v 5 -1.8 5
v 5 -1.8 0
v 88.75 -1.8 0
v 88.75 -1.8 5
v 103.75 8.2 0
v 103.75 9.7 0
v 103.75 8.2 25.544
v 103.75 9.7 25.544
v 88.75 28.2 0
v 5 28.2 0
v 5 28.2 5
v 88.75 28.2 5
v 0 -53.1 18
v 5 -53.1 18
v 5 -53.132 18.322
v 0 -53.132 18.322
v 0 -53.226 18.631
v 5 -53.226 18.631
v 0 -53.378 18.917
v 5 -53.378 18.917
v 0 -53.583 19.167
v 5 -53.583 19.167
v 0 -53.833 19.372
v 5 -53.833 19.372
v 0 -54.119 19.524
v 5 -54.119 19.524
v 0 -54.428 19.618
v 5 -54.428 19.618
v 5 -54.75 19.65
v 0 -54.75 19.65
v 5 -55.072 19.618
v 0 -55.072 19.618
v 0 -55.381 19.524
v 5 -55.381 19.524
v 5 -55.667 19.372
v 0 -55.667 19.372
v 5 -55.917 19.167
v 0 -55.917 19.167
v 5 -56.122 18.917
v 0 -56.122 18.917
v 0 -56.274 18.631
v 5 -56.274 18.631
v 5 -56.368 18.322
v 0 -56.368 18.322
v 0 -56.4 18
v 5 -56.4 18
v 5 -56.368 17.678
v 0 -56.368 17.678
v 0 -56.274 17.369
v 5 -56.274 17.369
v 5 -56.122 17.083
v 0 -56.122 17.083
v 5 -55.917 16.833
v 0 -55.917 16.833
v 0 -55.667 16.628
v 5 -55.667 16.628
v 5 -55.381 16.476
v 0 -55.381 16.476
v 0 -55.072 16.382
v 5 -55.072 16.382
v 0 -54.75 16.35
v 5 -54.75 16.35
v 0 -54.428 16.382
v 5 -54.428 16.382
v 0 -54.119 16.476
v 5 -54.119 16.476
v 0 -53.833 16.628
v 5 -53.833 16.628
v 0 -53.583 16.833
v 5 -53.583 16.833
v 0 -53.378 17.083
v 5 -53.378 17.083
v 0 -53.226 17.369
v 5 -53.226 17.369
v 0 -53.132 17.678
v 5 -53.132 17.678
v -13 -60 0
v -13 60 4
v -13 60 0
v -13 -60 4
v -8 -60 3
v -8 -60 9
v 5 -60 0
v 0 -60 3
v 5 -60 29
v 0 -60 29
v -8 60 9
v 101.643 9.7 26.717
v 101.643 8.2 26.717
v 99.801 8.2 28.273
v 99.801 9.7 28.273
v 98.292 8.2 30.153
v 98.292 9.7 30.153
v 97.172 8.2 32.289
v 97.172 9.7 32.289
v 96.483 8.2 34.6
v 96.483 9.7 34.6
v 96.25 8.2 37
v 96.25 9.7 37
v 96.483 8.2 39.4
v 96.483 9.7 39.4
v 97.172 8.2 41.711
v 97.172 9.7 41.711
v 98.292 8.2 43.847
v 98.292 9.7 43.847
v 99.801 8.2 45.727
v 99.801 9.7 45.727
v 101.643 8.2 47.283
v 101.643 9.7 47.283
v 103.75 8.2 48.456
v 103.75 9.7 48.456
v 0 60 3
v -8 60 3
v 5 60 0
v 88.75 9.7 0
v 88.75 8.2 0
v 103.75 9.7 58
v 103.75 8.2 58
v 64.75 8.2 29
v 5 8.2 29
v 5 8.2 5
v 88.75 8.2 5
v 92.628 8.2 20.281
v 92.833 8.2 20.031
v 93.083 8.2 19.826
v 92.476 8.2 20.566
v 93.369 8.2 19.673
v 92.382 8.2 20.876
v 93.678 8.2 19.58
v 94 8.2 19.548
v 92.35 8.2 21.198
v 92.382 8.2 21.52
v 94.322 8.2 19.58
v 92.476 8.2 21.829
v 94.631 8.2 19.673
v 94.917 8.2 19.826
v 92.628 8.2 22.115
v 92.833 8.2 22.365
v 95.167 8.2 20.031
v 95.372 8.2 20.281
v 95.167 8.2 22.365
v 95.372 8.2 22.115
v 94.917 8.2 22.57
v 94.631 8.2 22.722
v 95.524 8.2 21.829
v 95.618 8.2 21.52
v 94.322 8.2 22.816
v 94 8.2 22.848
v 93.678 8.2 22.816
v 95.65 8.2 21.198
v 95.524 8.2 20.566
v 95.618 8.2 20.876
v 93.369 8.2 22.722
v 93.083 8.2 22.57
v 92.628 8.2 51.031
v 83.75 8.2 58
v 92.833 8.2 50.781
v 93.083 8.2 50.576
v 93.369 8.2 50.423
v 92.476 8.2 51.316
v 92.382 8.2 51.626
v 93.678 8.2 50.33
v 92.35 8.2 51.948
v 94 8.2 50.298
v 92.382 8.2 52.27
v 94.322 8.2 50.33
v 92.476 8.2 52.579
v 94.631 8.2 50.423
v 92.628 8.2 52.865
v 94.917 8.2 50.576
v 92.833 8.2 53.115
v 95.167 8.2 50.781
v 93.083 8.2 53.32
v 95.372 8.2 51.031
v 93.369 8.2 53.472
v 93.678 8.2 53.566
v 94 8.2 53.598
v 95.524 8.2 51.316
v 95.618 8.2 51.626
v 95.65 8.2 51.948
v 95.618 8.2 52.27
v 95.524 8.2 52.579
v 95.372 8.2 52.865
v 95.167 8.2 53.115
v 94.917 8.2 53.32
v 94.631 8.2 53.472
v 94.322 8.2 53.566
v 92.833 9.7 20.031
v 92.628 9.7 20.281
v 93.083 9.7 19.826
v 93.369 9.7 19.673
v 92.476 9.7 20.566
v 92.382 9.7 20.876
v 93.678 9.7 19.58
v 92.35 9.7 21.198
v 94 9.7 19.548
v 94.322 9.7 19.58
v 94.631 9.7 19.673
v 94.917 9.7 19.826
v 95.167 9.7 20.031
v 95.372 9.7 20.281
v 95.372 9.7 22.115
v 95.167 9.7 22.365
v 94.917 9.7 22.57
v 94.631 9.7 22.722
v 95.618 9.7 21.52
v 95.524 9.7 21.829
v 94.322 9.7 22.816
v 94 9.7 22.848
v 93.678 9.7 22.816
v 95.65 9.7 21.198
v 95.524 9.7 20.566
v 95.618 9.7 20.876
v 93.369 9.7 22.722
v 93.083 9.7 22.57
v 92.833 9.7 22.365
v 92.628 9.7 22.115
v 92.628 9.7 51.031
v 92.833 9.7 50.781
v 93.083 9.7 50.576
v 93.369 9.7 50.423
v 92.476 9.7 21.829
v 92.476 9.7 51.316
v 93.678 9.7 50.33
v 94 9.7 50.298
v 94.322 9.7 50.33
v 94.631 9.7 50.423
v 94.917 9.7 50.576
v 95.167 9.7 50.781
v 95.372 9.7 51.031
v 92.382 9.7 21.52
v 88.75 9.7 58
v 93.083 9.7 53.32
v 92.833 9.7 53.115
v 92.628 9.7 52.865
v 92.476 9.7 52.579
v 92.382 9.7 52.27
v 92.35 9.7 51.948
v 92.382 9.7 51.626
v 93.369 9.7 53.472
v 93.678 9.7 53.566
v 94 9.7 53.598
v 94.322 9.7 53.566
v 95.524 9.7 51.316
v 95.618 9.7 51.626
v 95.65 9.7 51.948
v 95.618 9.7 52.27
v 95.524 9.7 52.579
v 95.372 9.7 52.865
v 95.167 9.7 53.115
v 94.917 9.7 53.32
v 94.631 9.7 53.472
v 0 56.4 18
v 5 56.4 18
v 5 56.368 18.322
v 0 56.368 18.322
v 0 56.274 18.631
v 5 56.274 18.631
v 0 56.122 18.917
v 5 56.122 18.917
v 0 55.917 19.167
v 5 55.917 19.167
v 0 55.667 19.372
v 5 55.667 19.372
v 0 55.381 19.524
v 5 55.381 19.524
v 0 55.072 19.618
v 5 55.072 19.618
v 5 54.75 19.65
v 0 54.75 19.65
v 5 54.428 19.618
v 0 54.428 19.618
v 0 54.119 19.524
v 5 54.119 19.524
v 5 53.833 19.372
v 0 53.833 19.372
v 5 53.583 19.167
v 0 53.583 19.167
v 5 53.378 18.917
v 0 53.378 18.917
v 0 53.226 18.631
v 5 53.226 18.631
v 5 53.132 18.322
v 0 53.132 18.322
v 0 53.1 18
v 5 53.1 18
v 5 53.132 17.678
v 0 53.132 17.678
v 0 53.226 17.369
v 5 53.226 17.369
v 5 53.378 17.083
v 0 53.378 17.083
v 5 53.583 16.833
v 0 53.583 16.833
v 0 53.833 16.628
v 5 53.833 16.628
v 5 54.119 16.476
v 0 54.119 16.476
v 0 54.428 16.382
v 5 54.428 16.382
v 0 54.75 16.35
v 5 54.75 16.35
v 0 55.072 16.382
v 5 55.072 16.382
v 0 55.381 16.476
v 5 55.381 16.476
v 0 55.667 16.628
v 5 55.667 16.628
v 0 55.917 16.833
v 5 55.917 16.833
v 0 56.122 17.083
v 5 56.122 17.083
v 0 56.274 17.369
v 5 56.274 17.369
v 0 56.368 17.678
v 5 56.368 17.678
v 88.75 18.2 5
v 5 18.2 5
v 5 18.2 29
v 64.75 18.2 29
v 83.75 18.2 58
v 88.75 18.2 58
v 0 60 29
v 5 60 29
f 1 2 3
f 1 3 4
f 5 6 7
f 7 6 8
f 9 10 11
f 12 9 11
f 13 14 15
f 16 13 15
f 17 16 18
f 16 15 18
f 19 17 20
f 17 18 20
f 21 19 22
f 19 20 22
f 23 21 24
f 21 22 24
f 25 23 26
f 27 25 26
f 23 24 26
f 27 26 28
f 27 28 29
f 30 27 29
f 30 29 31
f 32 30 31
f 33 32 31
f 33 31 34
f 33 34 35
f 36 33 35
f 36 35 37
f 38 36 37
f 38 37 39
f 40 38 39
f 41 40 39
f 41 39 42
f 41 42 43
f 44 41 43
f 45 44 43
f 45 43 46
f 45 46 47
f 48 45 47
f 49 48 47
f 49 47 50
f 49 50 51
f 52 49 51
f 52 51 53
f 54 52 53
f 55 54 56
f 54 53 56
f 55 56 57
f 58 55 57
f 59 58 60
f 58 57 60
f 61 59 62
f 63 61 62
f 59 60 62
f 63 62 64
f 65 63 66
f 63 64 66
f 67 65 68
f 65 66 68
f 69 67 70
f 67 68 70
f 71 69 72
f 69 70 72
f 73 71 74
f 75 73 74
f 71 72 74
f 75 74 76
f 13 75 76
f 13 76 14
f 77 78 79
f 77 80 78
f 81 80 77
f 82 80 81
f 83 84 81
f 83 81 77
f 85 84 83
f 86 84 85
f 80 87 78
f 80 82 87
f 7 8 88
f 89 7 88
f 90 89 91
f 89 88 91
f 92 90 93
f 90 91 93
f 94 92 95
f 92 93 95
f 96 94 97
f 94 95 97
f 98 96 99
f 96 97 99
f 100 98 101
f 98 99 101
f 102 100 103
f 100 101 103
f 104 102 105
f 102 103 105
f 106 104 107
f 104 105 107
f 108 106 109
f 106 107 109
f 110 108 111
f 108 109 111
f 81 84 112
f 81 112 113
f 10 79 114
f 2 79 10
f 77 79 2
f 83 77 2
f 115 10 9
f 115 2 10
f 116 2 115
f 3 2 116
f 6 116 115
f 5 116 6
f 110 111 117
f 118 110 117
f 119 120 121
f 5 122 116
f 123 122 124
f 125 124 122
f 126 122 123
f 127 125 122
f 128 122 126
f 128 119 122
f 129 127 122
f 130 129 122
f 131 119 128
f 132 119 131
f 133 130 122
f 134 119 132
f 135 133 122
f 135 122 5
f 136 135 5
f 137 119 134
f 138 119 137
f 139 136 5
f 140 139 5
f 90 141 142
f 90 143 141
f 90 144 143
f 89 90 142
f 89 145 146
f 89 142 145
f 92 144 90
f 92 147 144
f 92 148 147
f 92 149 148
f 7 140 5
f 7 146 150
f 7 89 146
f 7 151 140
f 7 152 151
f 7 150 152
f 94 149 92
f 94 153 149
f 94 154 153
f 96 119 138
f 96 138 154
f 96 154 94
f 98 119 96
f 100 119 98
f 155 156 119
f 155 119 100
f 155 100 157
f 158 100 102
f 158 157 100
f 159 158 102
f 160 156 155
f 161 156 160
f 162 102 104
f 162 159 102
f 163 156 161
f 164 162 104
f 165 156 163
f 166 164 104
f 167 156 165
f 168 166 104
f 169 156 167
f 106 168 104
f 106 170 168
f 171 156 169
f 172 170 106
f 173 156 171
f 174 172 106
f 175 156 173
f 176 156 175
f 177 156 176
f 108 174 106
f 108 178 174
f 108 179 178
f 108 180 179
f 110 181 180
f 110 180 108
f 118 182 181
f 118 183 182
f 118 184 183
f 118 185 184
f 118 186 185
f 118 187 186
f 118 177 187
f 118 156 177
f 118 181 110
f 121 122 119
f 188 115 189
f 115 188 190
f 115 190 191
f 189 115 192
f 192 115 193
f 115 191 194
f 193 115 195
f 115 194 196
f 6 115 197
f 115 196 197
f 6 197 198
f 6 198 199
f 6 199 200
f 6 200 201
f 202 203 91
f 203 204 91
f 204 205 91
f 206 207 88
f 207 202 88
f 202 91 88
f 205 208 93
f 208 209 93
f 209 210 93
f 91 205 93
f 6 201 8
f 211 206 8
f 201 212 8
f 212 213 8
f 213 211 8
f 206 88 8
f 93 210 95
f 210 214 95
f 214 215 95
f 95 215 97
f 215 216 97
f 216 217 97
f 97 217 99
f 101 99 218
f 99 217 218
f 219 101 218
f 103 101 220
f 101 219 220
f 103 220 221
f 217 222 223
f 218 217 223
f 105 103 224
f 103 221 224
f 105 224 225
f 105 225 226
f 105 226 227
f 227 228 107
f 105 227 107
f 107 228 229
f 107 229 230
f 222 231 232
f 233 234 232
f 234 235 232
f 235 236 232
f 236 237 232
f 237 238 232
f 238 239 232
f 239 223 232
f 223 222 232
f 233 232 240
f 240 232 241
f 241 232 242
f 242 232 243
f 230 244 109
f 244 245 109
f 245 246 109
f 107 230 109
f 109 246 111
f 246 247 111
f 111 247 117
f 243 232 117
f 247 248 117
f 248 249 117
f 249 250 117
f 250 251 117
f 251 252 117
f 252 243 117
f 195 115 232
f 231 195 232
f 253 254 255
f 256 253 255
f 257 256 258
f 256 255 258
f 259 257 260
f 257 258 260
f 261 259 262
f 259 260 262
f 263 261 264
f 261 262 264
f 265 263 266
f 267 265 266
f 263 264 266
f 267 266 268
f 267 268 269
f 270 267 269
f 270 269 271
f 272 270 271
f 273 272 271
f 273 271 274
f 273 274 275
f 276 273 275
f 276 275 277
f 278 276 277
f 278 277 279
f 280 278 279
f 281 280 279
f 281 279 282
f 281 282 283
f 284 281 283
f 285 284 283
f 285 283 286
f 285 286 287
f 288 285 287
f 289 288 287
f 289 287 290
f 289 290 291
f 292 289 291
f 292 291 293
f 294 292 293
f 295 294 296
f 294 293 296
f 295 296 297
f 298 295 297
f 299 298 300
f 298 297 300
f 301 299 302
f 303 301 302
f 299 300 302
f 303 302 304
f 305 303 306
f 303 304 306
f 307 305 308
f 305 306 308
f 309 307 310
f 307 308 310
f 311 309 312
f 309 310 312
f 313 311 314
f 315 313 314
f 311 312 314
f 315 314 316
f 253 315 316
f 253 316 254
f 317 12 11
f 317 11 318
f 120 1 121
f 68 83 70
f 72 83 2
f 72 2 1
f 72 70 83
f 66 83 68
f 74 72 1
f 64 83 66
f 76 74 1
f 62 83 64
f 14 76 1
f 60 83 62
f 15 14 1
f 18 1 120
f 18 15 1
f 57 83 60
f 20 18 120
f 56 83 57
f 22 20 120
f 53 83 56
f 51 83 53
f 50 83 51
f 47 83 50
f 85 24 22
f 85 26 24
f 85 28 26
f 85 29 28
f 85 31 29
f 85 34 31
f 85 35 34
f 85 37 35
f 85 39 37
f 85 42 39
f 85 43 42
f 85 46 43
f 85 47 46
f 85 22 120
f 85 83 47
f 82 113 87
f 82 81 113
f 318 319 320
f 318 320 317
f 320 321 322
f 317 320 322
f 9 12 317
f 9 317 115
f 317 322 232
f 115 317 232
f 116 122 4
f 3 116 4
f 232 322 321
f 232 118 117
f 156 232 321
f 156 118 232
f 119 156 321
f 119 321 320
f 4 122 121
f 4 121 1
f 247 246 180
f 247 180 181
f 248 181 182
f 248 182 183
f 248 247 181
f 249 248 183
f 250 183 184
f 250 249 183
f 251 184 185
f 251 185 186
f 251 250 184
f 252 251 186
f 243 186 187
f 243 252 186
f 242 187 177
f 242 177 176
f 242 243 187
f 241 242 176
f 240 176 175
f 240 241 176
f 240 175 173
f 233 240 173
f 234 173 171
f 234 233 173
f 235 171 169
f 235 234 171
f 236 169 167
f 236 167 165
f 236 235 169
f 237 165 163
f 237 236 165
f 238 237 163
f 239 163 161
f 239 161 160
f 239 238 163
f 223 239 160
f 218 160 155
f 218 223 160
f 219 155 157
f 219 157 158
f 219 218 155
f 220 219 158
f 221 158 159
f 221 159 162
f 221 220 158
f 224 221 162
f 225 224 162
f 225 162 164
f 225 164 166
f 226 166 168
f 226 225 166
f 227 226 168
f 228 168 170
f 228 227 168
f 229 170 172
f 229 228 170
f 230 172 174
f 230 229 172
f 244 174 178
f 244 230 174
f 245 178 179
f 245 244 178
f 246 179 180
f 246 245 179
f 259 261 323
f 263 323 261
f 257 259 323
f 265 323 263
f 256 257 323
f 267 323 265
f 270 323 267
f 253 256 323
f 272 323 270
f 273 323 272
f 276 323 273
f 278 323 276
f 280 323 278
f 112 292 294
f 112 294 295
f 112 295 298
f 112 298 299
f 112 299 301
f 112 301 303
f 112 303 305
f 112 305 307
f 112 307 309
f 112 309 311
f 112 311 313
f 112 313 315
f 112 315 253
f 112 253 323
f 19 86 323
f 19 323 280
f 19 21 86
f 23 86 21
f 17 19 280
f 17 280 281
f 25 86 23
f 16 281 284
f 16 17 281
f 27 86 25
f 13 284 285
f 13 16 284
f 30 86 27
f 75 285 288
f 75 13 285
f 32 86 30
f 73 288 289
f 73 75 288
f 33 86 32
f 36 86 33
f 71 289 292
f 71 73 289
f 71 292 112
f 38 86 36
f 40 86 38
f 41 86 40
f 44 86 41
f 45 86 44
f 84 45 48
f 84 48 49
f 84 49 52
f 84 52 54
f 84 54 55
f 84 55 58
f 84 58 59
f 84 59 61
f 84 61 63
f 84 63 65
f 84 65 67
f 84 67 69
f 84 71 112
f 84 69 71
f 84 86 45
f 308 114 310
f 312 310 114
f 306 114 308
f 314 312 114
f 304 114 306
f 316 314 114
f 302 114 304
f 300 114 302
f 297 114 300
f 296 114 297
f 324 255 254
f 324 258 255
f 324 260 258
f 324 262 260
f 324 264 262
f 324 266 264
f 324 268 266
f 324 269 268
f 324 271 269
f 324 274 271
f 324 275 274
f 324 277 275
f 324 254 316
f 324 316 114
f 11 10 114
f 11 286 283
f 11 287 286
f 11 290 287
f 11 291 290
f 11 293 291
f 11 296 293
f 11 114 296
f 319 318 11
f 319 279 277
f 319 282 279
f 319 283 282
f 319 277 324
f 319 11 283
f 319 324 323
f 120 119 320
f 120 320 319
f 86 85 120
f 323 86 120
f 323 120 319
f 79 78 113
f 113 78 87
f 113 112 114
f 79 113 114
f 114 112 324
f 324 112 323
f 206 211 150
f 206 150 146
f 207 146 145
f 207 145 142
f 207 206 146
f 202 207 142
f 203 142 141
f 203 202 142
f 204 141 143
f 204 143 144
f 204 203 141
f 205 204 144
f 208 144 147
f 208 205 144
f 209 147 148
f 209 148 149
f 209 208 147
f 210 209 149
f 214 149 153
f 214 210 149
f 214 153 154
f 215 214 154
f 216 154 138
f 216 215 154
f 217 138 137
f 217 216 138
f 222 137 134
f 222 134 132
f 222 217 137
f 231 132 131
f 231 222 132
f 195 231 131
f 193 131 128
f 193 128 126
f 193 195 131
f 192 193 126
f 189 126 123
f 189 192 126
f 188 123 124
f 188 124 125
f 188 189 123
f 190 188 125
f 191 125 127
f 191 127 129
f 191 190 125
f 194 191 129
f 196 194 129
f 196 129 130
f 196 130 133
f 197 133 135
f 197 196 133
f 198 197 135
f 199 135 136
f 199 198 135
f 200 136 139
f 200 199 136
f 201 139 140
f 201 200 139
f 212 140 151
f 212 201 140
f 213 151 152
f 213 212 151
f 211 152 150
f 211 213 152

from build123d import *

# Parameters (mm, degrees)
F1_R          = 1.65
F2_DEPTH      = 1.5
F3_DEPTH      = 1.5
F3_DEPTH_BACK = 8.5
F4_W          = 10
F4_H          = 5
F5_DEPTH      = 88.75
F7_DEPTH      = 60
F9_D          = 3.3


with BuildPart() as f2:
    # F1 (on offset) → F2 (new body)
    with BuildSketch(Plane.XZ.offset(-9.7)):
        with BuildLine():
            Line((88.75, 58), (88.75, 0))
            Line((88.75, 0), (103.75, 0))
            Line((103.75, 0), (103.75, 25.543561))
            ThreePointArc((103.75, 25.543561), (96.25, 37), (103.75, 48.456439))
            Line((103.75, 48.456439), (103.75, 58))
            Line((103.75, 58), (88.75, 58))
        make_face()
        with Locations((94, 21.197826)):
            Circle(F1_R, mode=Mode.SUBTRACT)
        with Locations((94, 51.947826)):
            Circle(F1_R, mode=Mode.SUBTRACT)
    extrude(amount=F2_DEPTH)

    # F1 (on offset) → F3 (join, two sides)
    with BuildSketch(Plane.XZ.offset(-9.7)) as f3_sk:
        Polygon((0, 0), (88.75, 0), (88.75, 58), (83.75, 58), (64.75, 29), (0, 29), align=None)
    extrude(amount=F3_DEPTH)
    extrude(f3_sk.sketch, amount=-F3_DEPTH_BACK)

    # F4 (on face) → F5 (join, through all)
    with BuildSketch(Plane(origin=(0, 0, 0), x_dir=(0, -1, 0), z_dir=(-1, 0, 0))):
        with Locations((-23.2, 2.5)):
            Rectangle(F4_W, F4_H)
        with Locations((-3.2, 2.5)):
            Rectangle(F4_W, F4_H)
    extrude(amount=-F5_DEPTH)

    # F6 (on Front) → F7 (join, symmetric)
    with BuildSketch(Plane.XZ):
        Polygon((-13, 4), (-13, 0), (5, 0), (5, 29), (0, 29), (0, 3), (-8, 3), (-8, 9), align=None)
    extrude(amount=F7_DEPTH, both=True)

    # F9 (through all)
    with Locations(Plane(origin=(0, 0, 0), x_dir=(0, -1, 0), z_dir=(-1, 0, 0))):
        with Locations((54.75, 18), (-54.75, 18)):
            Hole(F9_D / 2)


solid = f2.part
